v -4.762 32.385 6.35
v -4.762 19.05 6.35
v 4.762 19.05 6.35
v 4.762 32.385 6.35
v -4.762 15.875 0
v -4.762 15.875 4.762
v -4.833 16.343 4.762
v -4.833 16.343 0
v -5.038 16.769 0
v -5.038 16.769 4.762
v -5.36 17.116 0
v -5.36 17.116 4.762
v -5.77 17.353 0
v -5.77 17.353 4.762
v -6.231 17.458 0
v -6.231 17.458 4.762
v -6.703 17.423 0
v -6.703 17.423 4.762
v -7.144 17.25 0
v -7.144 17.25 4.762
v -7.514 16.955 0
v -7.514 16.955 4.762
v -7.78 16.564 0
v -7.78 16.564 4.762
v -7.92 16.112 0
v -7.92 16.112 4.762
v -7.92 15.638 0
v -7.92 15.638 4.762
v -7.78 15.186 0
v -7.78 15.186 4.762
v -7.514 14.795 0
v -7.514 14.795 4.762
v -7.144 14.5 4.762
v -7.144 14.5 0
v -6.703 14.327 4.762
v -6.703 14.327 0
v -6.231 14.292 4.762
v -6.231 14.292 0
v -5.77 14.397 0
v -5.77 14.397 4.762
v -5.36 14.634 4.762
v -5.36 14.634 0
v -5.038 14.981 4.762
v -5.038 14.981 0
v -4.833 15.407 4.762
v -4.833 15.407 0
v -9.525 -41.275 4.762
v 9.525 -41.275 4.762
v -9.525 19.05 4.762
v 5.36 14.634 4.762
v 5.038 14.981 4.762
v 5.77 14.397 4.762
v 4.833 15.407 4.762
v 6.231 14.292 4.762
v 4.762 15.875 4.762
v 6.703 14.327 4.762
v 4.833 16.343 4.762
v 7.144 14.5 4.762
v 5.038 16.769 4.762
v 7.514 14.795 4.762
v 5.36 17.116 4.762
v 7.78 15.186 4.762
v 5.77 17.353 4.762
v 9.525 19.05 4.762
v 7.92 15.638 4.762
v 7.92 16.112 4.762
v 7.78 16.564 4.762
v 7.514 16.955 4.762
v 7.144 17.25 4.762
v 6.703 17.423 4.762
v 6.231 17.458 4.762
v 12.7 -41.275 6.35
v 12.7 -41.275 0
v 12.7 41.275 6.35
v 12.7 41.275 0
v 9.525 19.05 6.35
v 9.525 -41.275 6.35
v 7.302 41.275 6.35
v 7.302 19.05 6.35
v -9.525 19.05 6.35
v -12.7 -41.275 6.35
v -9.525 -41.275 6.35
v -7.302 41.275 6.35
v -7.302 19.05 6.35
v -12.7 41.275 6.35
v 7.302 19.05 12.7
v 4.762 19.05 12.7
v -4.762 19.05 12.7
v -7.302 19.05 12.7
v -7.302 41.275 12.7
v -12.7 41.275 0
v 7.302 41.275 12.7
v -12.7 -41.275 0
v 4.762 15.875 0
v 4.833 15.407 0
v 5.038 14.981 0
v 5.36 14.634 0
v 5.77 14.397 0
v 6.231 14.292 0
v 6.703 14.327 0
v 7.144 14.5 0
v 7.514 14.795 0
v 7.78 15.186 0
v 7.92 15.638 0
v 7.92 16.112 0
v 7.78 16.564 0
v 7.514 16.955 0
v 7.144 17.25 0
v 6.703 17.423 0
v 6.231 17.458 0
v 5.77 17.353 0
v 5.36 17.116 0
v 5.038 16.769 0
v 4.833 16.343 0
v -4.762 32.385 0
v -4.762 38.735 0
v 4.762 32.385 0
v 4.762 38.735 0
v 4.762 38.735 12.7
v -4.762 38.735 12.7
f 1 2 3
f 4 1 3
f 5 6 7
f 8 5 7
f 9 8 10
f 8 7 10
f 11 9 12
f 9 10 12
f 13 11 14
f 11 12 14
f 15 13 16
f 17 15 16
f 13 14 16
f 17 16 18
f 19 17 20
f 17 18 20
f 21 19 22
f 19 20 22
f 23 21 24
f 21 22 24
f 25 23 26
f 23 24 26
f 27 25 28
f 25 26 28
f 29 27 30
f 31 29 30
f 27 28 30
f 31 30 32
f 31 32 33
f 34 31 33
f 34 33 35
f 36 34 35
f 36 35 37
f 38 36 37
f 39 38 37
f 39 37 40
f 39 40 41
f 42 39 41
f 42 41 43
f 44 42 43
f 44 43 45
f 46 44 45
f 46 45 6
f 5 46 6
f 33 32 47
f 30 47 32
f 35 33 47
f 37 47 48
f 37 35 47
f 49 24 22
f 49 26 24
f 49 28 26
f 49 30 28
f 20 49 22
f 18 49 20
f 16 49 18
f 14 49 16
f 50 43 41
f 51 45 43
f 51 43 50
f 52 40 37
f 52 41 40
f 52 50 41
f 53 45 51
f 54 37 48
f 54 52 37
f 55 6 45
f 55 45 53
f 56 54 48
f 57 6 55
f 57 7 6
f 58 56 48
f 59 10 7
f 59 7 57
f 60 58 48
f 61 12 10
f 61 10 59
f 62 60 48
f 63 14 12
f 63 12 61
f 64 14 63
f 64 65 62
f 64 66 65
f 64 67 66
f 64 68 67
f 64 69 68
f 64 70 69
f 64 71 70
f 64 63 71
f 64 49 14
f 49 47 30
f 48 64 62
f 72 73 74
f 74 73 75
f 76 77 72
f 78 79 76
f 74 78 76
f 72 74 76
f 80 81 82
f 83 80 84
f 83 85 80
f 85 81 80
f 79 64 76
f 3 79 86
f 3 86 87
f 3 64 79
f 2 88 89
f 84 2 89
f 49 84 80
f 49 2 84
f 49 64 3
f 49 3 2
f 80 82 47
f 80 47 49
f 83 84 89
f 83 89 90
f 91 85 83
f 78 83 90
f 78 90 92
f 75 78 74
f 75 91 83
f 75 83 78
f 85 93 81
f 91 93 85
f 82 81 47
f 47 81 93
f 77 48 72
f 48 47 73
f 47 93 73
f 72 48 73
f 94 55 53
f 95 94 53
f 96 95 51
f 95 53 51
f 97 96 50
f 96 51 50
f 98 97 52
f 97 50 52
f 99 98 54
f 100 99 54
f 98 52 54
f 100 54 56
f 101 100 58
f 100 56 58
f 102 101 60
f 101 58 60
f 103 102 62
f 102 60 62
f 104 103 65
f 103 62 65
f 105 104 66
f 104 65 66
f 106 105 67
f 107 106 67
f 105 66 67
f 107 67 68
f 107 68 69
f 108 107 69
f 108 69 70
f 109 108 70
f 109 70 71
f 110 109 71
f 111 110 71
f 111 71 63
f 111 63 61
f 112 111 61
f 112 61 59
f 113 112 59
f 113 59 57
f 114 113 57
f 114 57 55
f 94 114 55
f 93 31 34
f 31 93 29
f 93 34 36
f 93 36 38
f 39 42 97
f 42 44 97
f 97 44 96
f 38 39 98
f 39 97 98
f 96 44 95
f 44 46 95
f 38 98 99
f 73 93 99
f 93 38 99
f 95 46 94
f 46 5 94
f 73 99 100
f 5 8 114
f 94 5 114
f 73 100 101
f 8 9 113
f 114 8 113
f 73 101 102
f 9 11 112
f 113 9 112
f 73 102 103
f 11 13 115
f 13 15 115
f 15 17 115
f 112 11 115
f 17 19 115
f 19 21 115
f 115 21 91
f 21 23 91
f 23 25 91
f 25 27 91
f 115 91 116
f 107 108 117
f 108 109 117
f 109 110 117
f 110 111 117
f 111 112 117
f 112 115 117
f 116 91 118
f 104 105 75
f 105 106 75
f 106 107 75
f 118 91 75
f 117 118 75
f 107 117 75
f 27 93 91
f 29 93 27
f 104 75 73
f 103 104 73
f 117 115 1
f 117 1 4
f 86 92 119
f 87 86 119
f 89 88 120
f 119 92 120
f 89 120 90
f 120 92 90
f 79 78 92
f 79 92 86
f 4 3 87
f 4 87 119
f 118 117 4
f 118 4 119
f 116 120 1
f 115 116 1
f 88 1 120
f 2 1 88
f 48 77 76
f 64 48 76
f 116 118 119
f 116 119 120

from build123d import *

# Parameters (mm, degrees)
SKETCH1_W               = 25.4
SKETCH1_H               = 82.55
BOSS_EXTRUDE1_DEPTH     = 6.35
SKETCH2_R               = 1.5875
CUT_EXTRUDE1_DEPTH      = 44.649033494
SKETCH3_W               = 19.05
SKETCH3_H               = 60.325
CUT_EXTRUDE2_DEPTH      = 1.5875
CUT_EXTRUDE3_DEPTH      = 44.649033494
CUT_EXTRUDE3_DEPTH_BACK = 44.649033494
SKETCH5_W               = 9.525
SKETCH5_H               = 6.35
BOSS_EXTRUDE2_DEPTH     = 6.35


with BuildPart() as part:
    # Sketch1 → Boss-Extrude1 (new body)
    with BuildSketch(Plane.XY):
        Rectangle(SKETCH1_W, SKETCH1_H)
    extrude(amount=BOSS_EXTRUDE1_DEPTH)

    # Sketch2 → Cut-Extrude1 (cut, through all)
    with BuildSketch(Plane.XY.offset(6.35)):
        with Locations((-6.35, 15.875)):
            Circle(SKETCH2_R)
        with Locations(Location((6.35, 15.875, 0), (0, 0, 180))):
            Circle(SKETCH2_R)
    extrude(amount=-CUT_EXTRUDE1_DEPTH, mode=Mode.SUBTRACT)

    # Sketch3 → Cut-Extrude2 (cut)
    with BuildSketch(Plane.XY.offset(6.35)):
        with Locations((0, -11.1125)):
            Rectangle(SKETCH3_W, SKETCH3_H)
    extrude(amount=-CUT_EXTRUDE2_DEPTH, mode=Mode.SUBTRACT)

    # Sketch5 → Cut-Extrude3 (cut, two sides: drawn at the far end of the back side and taken through both)
    with BuildSketch(Plane.XY.offset(6.35).offset(-CUT_EXTRUDE3_DEPTH_BACK)):
        with Locations((0, 35.56)):
            Rectangle(SKETCH5_W, SKETCH5_H)
    extrude(amount=CUT_EXTRUDE3_DEPTH + CUT_EXTRUDE3_DEPTH_BACK, mode=Mode.SUBTRACT)

    # Sketch6 → Boss-Extrude2 (add)
    with BuildSketch(Plane.XY.offset(6.35)):
        Polygon((-7.3025, 41.275), (7.3025, 41.275), (7.3025, 19.05), (4.7625, 19.05), (4.7625, 38.735), (-4.7625, 38.735), (-4.7625, 19.05), (-7.3025, 19.05), align=None)
    extrude(amount=BOSS_EXTRUDE2_DEPTH)


solid = part.part
